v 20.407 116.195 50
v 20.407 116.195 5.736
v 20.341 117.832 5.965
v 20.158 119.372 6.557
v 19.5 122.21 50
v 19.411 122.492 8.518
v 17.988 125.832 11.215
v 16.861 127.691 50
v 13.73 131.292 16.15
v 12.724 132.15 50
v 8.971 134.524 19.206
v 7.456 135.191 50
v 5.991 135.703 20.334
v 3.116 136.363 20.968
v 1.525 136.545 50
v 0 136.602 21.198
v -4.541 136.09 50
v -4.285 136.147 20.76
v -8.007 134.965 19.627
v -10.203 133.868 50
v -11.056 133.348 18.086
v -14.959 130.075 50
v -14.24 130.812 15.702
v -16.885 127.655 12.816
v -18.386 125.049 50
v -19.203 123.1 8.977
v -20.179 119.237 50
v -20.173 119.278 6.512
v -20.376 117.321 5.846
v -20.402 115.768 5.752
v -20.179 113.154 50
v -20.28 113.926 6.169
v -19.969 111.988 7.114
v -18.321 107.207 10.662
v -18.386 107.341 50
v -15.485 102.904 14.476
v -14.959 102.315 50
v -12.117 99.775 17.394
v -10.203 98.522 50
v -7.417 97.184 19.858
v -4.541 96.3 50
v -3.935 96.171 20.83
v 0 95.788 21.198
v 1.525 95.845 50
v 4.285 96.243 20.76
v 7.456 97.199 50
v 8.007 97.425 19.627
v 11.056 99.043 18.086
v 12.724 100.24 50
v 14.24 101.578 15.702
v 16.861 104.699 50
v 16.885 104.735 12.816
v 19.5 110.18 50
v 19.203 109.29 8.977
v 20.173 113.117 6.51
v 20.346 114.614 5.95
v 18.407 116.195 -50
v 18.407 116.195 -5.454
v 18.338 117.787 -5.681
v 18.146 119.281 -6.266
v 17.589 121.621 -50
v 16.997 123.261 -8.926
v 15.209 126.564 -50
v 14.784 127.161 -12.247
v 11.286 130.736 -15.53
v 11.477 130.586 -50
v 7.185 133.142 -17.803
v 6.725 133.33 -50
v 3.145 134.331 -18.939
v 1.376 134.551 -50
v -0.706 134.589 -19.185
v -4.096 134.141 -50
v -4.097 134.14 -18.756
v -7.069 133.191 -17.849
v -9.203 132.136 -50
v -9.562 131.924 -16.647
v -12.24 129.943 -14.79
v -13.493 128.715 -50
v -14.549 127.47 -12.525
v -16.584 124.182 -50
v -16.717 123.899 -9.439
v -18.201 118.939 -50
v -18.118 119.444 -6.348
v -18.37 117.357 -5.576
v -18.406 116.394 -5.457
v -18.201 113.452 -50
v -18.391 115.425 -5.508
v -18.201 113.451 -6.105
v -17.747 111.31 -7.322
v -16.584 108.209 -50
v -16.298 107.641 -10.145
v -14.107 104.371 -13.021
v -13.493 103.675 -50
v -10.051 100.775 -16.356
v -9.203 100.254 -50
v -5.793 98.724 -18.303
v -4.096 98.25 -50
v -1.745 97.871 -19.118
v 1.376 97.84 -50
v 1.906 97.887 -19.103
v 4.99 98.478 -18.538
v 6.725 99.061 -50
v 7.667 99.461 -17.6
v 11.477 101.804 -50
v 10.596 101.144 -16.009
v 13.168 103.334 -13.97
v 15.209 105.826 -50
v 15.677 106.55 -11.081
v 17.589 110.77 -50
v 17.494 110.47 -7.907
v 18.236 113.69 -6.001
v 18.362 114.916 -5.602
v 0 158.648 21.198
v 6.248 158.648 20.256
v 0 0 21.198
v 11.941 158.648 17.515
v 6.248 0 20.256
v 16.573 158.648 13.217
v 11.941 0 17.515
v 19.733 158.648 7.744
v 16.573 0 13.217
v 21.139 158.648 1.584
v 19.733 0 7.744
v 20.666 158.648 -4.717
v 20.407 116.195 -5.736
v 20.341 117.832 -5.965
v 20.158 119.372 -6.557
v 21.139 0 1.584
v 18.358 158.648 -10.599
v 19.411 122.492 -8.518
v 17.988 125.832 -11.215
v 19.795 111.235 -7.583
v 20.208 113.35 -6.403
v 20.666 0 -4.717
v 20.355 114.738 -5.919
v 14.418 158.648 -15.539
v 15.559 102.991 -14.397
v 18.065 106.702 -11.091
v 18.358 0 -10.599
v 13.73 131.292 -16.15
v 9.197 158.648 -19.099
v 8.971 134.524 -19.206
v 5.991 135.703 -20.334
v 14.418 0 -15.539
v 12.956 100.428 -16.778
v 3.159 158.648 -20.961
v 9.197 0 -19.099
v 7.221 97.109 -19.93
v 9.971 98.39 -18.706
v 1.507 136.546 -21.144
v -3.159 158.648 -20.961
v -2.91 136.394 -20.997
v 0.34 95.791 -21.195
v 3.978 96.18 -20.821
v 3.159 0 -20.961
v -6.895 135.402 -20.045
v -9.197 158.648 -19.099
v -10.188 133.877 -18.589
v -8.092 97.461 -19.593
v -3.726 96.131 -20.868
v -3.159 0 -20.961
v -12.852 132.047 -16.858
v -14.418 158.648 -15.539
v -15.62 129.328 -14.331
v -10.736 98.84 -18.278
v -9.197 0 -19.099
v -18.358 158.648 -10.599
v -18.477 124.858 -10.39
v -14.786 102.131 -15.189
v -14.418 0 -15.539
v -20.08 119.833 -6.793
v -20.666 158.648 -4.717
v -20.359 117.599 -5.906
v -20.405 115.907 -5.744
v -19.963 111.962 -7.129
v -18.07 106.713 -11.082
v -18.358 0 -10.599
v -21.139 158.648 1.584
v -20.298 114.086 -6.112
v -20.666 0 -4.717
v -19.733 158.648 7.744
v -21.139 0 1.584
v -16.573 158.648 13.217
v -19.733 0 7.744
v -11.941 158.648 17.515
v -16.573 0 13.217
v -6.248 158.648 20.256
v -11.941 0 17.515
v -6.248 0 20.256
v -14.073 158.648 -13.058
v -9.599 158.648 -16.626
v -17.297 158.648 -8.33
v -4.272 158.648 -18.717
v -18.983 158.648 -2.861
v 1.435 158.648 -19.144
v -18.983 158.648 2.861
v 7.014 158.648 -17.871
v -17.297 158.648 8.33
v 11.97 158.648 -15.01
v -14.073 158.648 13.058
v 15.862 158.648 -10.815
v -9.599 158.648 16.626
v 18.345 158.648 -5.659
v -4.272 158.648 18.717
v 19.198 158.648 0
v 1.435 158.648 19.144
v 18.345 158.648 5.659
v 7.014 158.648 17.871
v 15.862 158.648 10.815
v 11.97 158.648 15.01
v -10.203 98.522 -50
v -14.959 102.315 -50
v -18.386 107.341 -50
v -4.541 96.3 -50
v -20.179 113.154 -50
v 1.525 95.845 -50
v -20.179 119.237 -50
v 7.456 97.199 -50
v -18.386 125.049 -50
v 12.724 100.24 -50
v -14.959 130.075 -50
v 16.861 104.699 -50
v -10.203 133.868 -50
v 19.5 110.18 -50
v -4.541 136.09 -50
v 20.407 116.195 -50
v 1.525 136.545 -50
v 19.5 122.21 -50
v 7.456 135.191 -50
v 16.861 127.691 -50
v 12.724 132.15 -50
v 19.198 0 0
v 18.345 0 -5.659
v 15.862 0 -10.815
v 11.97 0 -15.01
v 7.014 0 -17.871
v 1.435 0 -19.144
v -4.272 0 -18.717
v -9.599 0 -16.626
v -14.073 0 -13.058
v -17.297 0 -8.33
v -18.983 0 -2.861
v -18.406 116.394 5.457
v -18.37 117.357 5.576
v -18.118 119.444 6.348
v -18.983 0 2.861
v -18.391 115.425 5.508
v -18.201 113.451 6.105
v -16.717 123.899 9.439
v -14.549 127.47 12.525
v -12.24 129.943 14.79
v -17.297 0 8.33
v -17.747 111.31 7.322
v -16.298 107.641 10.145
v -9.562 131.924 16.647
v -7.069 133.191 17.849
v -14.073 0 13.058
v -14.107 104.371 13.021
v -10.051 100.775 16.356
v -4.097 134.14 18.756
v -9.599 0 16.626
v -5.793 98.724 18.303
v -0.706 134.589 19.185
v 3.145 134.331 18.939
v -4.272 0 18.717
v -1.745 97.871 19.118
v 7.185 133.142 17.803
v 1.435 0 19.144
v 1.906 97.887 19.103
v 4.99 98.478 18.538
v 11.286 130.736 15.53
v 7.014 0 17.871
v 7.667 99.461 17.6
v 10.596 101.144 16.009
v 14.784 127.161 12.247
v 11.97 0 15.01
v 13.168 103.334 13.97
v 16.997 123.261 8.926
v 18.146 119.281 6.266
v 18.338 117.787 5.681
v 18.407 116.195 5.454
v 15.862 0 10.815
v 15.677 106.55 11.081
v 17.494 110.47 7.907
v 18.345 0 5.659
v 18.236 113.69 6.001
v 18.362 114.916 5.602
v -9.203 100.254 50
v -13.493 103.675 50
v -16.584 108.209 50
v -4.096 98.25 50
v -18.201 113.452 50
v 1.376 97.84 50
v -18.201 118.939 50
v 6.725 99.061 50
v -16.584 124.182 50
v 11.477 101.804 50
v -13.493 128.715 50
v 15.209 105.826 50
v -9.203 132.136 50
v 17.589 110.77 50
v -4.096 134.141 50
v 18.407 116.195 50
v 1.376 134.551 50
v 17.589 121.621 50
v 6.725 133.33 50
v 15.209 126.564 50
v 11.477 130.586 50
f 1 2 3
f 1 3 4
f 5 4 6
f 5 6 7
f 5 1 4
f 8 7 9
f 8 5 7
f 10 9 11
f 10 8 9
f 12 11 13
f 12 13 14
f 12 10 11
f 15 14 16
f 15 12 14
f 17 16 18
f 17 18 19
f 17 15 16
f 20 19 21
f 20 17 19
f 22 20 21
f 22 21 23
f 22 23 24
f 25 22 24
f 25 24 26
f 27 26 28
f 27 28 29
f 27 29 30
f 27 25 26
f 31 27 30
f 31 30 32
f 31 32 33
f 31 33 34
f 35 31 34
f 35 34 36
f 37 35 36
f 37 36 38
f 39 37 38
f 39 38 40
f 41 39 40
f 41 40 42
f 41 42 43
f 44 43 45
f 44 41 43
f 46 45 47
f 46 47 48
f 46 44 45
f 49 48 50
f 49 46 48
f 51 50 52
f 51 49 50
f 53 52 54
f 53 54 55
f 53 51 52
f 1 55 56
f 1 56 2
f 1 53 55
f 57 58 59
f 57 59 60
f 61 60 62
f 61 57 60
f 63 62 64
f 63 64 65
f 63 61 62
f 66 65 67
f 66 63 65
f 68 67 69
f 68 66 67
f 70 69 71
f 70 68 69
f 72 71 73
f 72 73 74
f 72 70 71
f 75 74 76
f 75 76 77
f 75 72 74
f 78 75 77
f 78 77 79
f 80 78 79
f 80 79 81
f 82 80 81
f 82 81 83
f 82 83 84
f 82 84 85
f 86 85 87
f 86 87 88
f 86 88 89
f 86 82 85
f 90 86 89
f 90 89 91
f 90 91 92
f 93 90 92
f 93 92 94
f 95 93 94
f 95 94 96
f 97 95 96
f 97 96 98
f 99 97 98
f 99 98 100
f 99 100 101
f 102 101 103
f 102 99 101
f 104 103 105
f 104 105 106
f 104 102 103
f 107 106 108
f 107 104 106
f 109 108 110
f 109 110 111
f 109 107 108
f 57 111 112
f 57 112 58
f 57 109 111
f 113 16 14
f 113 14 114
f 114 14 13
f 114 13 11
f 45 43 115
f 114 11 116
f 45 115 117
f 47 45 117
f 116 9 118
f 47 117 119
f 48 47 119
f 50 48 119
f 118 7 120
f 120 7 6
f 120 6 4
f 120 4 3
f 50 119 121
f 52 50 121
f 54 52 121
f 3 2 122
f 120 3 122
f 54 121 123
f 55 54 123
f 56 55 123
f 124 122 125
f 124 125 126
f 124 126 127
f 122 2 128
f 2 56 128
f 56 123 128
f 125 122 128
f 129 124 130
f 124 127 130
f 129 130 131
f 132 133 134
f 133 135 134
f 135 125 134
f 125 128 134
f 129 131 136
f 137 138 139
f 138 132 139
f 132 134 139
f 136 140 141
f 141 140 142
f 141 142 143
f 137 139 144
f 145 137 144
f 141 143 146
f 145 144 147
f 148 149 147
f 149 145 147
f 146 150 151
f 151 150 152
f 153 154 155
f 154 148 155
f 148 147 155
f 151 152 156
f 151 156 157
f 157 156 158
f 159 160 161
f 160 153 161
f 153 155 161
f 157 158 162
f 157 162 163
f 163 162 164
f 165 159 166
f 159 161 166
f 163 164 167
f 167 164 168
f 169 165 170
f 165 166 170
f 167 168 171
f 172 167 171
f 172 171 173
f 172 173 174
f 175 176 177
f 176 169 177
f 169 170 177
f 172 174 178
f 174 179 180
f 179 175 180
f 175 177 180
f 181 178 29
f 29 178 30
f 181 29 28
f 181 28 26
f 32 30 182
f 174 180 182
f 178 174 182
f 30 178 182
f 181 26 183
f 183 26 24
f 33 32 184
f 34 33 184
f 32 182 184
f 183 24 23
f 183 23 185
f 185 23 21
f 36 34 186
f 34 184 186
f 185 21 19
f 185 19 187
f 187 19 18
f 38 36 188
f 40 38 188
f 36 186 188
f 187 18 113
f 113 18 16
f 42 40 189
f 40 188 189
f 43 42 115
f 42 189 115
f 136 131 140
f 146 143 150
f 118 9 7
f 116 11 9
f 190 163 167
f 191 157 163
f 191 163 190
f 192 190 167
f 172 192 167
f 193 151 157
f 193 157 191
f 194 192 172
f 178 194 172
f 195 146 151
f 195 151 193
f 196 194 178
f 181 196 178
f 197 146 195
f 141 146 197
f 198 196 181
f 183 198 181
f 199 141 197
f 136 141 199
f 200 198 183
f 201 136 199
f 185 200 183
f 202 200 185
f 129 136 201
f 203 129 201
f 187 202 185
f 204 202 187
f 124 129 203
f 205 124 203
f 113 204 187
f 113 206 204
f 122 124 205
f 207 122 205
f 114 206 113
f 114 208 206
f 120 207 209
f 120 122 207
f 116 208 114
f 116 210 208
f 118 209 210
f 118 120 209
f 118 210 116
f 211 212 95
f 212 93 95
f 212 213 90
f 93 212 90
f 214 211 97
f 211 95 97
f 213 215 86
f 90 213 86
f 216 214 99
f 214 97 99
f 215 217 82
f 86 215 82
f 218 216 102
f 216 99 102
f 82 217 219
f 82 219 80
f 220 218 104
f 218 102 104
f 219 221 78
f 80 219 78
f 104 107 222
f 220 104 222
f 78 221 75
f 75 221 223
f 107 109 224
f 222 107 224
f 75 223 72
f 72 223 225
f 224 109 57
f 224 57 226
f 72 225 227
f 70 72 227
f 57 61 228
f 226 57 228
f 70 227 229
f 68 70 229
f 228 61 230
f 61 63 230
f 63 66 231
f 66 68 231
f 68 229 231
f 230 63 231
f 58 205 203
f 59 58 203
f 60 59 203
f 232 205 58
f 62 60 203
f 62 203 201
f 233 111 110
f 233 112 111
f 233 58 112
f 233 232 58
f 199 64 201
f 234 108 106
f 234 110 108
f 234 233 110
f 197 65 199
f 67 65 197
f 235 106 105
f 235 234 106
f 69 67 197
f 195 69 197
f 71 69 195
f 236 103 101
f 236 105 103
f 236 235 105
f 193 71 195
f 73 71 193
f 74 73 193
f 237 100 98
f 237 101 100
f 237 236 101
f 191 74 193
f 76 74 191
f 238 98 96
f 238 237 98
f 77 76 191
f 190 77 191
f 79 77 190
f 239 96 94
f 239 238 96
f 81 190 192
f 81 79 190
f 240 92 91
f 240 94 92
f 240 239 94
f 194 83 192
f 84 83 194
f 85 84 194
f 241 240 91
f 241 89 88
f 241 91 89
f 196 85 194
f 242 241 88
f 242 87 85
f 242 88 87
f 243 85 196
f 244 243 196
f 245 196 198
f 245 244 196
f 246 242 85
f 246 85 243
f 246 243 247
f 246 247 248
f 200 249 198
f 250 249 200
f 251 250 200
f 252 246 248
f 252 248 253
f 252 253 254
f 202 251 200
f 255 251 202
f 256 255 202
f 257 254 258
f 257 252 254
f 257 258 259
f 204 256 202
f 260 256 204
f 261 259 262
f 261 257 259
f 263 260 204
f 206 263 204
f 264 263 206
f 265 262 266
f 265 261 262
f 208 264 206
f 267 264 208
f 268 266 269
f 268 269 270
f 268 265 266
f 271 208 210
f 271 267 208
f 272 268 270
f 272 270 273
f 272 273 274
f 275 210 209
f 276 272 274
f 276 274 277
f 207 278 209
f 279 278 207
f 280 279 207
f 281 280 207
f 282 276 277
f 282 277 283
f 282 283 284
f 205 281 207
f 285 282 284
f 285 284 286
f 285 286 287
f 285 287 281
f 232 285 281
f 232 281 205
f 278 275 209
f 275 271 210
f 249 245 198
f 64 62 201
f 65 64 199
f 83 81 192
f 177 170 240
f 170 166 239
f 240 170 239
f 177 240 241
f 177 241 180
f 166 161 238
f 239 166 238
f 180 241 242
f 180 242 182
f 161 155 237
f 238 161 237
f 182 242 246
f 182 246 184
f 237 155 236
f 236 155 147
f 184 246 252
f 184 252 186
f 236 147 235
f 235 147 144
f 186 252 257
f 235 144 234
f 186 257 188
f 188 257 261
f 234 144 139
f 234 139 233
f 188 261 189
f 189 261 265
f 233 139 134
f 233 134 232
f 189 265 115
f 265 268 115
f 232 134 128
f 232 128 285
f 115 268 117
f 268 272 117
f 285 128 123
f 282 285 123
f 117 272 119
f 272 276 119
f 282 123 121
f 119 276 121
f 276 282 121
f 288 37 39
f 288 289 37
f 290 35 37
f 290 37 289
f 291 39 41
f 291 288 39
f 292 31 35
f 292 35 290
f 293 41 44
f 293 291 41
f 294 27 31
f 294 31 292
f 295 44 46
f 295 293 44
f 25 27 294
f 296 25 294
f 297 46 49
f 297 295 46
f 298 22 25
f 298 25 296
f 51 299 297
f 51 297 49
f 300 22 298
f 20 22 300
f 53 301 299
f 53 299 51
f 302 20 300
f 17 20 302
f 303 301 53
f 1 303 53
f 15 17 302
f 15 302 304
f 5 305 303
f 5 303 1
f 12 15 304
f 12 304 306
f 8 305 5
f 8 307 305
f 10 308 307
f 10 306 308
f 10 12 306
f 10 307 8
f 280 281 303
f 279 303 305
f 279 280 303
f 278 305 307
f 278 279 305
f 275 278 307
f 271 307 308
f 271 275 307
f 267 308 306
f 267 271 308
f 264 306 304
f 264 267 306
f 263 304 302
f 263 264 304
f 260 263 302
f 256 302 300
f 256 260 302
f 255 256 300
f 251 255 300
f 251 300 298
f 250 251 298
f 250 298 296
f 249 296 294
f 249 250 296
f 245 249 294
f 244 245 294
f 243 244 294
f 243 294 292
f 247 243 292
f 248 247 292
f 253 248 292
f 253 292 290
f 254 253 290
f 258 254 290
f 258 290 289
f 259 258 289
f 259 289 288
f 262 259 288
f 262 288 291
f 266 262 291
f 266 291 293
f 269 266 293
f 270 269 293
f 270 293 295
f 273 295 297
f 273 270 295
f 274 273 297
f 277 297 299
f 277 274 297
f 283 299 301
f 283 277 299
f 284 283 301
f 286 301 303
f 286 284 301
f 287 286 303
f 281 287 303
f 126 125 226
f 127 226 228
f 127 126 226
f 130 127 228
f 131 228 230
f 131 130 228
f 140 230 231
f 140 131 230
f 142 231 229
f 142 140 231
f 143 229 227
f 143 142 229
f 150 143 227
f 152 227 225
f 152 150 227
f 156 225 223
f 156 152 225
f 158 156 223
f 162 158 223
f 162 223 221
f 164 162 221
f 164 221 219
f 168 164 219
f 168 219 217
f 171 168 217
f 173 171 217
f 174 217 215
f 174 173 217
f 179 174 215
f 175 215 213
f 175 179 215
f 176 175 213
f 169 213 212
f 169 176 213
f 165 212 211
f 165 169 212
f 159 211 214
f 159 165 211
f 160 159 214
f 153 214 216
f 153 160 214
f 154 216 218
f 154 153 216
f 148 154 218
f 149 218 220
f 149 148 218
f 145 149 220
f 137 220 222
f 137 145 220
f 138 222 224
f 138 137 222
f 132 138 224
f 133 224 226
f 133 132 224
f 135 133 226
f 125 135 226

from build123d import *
from OCP.BRepAlgoAPI import BRepAlgoAPI_Cut
from OCP.TopTools import TopTools_ListOfShape

# Parameters (mm, degrees)
SKETCH7_R           = 21.1979112
BOSS_EXTRUDE1_DEPTH = 180.647627
SKETCH12_R          = 20.406966807
BOSS_EXTRUDE6_DEPTH = 50
SHELL1_START        = -50
SHELL1_OUTLINE_R    = 18.406966807
SHELL1_DEPTH        = 100
SHELL1_2_OUTLINE_R  = 19.1979112
SHELL1_2_DEPTH      = 178.6476265
CUT_EXTRUDE1_START  = -22
SKETCH13_R          = 21.1979112
CUT_EXTRUDE1_DEPTH  = 22


with BuildPart() as part:
    # Sketch7 → Boss-Extrude1 (new body)
    with BuildSketch(Plane(origin=(0, 0, 0), x_dir=(1, 0, 0), z_dir=(0, 1, 0))):
        with Locations(Location((0, 0, 0), (0, 0, 270))):
            Circle(SKETCH7_R)
    extrude(amount=BOSS_EXTRUDE1_DEPTH)

    # Sketch12 → Boss-Extrude6 (add, symmetric)
    with BuildSketch(Plane.XY):
        with Locations((0, 116.195122616)):
            Circle(SKETCH12_R)
    extrude(amount=BOSS_EXTRUDE6_DEPTH, both=True)

    # Shell1: read off the stored shape, not the designer's step
    # Shell1 outline → Shell1 (cut)
    with BuildSketch(Plane.XY.offset(SHELL1_START)):
        with Locations((0, 116.195122616)):
            Circle(SHELL1_OUTLINE_R)
    extrude(amount=SHELL1_DEPTH, mode=Mode.SUBTRACT)

    # Shell1 2 outline → Shell1 2 (cut)
    with BuildSketch(Plane(origin=(0, 0, 0), x_dir=(1, 0, 0), z_dir=(0, 1, 0))):
        Circle(SHELL1_2_OUTLINE_R)
    extrude(amount=SHELL1_2_DEPTH, mode=Mode.SUBTRACT)


with BuildPart() as cut_extrude1_tool:
    # Sketch13 → Cut-Extrude1 (new body)
    with BuildSketch(Plane(origin=(0, 180.6476265, 0), x_dir=(1, 0, 0), z_dir=(0, 1, 0)).offset(CUT_EXTRUDE1_START)):
        with Locations(Location((0, 0, 0), (0, 0, 270))):
            Circle(SKETCH13_R)
    extrude(amount=CUT_EXTRUDE1_DEPTH)


with BuildPart() as part_1:
    add(part.part)

    # Cut-Extrude1: cut by cut_extrude1_tool, with a tolerance
    cut_extrude1_stock = TopTools_ListOfShape()
    cut_extrude1_stock.Append(part_1.part.wrapped)
    cut_extrude1_tools = TopTools_ListOfShape()
    cut_extrude1_tools.Append(cut_extrude1_tool.part.wrapped)
    cut_extrude1_cut = BRepAlgoAPI_Cut()
    cut_extrude1_cut.SetArguments(cut_extrude1_stock)
    cut_extrude1_cut.SetTools(cut_extrude1_tools)
    cut_extrude1_cut.SetFuzzyValue(0.00001)
    cut_extrude1_cut.Build()
    add(Compound.cast(cut_extrude1_cut.Shape()).solids(), mode=Mode.REPLACE)


solid = part_1.part
